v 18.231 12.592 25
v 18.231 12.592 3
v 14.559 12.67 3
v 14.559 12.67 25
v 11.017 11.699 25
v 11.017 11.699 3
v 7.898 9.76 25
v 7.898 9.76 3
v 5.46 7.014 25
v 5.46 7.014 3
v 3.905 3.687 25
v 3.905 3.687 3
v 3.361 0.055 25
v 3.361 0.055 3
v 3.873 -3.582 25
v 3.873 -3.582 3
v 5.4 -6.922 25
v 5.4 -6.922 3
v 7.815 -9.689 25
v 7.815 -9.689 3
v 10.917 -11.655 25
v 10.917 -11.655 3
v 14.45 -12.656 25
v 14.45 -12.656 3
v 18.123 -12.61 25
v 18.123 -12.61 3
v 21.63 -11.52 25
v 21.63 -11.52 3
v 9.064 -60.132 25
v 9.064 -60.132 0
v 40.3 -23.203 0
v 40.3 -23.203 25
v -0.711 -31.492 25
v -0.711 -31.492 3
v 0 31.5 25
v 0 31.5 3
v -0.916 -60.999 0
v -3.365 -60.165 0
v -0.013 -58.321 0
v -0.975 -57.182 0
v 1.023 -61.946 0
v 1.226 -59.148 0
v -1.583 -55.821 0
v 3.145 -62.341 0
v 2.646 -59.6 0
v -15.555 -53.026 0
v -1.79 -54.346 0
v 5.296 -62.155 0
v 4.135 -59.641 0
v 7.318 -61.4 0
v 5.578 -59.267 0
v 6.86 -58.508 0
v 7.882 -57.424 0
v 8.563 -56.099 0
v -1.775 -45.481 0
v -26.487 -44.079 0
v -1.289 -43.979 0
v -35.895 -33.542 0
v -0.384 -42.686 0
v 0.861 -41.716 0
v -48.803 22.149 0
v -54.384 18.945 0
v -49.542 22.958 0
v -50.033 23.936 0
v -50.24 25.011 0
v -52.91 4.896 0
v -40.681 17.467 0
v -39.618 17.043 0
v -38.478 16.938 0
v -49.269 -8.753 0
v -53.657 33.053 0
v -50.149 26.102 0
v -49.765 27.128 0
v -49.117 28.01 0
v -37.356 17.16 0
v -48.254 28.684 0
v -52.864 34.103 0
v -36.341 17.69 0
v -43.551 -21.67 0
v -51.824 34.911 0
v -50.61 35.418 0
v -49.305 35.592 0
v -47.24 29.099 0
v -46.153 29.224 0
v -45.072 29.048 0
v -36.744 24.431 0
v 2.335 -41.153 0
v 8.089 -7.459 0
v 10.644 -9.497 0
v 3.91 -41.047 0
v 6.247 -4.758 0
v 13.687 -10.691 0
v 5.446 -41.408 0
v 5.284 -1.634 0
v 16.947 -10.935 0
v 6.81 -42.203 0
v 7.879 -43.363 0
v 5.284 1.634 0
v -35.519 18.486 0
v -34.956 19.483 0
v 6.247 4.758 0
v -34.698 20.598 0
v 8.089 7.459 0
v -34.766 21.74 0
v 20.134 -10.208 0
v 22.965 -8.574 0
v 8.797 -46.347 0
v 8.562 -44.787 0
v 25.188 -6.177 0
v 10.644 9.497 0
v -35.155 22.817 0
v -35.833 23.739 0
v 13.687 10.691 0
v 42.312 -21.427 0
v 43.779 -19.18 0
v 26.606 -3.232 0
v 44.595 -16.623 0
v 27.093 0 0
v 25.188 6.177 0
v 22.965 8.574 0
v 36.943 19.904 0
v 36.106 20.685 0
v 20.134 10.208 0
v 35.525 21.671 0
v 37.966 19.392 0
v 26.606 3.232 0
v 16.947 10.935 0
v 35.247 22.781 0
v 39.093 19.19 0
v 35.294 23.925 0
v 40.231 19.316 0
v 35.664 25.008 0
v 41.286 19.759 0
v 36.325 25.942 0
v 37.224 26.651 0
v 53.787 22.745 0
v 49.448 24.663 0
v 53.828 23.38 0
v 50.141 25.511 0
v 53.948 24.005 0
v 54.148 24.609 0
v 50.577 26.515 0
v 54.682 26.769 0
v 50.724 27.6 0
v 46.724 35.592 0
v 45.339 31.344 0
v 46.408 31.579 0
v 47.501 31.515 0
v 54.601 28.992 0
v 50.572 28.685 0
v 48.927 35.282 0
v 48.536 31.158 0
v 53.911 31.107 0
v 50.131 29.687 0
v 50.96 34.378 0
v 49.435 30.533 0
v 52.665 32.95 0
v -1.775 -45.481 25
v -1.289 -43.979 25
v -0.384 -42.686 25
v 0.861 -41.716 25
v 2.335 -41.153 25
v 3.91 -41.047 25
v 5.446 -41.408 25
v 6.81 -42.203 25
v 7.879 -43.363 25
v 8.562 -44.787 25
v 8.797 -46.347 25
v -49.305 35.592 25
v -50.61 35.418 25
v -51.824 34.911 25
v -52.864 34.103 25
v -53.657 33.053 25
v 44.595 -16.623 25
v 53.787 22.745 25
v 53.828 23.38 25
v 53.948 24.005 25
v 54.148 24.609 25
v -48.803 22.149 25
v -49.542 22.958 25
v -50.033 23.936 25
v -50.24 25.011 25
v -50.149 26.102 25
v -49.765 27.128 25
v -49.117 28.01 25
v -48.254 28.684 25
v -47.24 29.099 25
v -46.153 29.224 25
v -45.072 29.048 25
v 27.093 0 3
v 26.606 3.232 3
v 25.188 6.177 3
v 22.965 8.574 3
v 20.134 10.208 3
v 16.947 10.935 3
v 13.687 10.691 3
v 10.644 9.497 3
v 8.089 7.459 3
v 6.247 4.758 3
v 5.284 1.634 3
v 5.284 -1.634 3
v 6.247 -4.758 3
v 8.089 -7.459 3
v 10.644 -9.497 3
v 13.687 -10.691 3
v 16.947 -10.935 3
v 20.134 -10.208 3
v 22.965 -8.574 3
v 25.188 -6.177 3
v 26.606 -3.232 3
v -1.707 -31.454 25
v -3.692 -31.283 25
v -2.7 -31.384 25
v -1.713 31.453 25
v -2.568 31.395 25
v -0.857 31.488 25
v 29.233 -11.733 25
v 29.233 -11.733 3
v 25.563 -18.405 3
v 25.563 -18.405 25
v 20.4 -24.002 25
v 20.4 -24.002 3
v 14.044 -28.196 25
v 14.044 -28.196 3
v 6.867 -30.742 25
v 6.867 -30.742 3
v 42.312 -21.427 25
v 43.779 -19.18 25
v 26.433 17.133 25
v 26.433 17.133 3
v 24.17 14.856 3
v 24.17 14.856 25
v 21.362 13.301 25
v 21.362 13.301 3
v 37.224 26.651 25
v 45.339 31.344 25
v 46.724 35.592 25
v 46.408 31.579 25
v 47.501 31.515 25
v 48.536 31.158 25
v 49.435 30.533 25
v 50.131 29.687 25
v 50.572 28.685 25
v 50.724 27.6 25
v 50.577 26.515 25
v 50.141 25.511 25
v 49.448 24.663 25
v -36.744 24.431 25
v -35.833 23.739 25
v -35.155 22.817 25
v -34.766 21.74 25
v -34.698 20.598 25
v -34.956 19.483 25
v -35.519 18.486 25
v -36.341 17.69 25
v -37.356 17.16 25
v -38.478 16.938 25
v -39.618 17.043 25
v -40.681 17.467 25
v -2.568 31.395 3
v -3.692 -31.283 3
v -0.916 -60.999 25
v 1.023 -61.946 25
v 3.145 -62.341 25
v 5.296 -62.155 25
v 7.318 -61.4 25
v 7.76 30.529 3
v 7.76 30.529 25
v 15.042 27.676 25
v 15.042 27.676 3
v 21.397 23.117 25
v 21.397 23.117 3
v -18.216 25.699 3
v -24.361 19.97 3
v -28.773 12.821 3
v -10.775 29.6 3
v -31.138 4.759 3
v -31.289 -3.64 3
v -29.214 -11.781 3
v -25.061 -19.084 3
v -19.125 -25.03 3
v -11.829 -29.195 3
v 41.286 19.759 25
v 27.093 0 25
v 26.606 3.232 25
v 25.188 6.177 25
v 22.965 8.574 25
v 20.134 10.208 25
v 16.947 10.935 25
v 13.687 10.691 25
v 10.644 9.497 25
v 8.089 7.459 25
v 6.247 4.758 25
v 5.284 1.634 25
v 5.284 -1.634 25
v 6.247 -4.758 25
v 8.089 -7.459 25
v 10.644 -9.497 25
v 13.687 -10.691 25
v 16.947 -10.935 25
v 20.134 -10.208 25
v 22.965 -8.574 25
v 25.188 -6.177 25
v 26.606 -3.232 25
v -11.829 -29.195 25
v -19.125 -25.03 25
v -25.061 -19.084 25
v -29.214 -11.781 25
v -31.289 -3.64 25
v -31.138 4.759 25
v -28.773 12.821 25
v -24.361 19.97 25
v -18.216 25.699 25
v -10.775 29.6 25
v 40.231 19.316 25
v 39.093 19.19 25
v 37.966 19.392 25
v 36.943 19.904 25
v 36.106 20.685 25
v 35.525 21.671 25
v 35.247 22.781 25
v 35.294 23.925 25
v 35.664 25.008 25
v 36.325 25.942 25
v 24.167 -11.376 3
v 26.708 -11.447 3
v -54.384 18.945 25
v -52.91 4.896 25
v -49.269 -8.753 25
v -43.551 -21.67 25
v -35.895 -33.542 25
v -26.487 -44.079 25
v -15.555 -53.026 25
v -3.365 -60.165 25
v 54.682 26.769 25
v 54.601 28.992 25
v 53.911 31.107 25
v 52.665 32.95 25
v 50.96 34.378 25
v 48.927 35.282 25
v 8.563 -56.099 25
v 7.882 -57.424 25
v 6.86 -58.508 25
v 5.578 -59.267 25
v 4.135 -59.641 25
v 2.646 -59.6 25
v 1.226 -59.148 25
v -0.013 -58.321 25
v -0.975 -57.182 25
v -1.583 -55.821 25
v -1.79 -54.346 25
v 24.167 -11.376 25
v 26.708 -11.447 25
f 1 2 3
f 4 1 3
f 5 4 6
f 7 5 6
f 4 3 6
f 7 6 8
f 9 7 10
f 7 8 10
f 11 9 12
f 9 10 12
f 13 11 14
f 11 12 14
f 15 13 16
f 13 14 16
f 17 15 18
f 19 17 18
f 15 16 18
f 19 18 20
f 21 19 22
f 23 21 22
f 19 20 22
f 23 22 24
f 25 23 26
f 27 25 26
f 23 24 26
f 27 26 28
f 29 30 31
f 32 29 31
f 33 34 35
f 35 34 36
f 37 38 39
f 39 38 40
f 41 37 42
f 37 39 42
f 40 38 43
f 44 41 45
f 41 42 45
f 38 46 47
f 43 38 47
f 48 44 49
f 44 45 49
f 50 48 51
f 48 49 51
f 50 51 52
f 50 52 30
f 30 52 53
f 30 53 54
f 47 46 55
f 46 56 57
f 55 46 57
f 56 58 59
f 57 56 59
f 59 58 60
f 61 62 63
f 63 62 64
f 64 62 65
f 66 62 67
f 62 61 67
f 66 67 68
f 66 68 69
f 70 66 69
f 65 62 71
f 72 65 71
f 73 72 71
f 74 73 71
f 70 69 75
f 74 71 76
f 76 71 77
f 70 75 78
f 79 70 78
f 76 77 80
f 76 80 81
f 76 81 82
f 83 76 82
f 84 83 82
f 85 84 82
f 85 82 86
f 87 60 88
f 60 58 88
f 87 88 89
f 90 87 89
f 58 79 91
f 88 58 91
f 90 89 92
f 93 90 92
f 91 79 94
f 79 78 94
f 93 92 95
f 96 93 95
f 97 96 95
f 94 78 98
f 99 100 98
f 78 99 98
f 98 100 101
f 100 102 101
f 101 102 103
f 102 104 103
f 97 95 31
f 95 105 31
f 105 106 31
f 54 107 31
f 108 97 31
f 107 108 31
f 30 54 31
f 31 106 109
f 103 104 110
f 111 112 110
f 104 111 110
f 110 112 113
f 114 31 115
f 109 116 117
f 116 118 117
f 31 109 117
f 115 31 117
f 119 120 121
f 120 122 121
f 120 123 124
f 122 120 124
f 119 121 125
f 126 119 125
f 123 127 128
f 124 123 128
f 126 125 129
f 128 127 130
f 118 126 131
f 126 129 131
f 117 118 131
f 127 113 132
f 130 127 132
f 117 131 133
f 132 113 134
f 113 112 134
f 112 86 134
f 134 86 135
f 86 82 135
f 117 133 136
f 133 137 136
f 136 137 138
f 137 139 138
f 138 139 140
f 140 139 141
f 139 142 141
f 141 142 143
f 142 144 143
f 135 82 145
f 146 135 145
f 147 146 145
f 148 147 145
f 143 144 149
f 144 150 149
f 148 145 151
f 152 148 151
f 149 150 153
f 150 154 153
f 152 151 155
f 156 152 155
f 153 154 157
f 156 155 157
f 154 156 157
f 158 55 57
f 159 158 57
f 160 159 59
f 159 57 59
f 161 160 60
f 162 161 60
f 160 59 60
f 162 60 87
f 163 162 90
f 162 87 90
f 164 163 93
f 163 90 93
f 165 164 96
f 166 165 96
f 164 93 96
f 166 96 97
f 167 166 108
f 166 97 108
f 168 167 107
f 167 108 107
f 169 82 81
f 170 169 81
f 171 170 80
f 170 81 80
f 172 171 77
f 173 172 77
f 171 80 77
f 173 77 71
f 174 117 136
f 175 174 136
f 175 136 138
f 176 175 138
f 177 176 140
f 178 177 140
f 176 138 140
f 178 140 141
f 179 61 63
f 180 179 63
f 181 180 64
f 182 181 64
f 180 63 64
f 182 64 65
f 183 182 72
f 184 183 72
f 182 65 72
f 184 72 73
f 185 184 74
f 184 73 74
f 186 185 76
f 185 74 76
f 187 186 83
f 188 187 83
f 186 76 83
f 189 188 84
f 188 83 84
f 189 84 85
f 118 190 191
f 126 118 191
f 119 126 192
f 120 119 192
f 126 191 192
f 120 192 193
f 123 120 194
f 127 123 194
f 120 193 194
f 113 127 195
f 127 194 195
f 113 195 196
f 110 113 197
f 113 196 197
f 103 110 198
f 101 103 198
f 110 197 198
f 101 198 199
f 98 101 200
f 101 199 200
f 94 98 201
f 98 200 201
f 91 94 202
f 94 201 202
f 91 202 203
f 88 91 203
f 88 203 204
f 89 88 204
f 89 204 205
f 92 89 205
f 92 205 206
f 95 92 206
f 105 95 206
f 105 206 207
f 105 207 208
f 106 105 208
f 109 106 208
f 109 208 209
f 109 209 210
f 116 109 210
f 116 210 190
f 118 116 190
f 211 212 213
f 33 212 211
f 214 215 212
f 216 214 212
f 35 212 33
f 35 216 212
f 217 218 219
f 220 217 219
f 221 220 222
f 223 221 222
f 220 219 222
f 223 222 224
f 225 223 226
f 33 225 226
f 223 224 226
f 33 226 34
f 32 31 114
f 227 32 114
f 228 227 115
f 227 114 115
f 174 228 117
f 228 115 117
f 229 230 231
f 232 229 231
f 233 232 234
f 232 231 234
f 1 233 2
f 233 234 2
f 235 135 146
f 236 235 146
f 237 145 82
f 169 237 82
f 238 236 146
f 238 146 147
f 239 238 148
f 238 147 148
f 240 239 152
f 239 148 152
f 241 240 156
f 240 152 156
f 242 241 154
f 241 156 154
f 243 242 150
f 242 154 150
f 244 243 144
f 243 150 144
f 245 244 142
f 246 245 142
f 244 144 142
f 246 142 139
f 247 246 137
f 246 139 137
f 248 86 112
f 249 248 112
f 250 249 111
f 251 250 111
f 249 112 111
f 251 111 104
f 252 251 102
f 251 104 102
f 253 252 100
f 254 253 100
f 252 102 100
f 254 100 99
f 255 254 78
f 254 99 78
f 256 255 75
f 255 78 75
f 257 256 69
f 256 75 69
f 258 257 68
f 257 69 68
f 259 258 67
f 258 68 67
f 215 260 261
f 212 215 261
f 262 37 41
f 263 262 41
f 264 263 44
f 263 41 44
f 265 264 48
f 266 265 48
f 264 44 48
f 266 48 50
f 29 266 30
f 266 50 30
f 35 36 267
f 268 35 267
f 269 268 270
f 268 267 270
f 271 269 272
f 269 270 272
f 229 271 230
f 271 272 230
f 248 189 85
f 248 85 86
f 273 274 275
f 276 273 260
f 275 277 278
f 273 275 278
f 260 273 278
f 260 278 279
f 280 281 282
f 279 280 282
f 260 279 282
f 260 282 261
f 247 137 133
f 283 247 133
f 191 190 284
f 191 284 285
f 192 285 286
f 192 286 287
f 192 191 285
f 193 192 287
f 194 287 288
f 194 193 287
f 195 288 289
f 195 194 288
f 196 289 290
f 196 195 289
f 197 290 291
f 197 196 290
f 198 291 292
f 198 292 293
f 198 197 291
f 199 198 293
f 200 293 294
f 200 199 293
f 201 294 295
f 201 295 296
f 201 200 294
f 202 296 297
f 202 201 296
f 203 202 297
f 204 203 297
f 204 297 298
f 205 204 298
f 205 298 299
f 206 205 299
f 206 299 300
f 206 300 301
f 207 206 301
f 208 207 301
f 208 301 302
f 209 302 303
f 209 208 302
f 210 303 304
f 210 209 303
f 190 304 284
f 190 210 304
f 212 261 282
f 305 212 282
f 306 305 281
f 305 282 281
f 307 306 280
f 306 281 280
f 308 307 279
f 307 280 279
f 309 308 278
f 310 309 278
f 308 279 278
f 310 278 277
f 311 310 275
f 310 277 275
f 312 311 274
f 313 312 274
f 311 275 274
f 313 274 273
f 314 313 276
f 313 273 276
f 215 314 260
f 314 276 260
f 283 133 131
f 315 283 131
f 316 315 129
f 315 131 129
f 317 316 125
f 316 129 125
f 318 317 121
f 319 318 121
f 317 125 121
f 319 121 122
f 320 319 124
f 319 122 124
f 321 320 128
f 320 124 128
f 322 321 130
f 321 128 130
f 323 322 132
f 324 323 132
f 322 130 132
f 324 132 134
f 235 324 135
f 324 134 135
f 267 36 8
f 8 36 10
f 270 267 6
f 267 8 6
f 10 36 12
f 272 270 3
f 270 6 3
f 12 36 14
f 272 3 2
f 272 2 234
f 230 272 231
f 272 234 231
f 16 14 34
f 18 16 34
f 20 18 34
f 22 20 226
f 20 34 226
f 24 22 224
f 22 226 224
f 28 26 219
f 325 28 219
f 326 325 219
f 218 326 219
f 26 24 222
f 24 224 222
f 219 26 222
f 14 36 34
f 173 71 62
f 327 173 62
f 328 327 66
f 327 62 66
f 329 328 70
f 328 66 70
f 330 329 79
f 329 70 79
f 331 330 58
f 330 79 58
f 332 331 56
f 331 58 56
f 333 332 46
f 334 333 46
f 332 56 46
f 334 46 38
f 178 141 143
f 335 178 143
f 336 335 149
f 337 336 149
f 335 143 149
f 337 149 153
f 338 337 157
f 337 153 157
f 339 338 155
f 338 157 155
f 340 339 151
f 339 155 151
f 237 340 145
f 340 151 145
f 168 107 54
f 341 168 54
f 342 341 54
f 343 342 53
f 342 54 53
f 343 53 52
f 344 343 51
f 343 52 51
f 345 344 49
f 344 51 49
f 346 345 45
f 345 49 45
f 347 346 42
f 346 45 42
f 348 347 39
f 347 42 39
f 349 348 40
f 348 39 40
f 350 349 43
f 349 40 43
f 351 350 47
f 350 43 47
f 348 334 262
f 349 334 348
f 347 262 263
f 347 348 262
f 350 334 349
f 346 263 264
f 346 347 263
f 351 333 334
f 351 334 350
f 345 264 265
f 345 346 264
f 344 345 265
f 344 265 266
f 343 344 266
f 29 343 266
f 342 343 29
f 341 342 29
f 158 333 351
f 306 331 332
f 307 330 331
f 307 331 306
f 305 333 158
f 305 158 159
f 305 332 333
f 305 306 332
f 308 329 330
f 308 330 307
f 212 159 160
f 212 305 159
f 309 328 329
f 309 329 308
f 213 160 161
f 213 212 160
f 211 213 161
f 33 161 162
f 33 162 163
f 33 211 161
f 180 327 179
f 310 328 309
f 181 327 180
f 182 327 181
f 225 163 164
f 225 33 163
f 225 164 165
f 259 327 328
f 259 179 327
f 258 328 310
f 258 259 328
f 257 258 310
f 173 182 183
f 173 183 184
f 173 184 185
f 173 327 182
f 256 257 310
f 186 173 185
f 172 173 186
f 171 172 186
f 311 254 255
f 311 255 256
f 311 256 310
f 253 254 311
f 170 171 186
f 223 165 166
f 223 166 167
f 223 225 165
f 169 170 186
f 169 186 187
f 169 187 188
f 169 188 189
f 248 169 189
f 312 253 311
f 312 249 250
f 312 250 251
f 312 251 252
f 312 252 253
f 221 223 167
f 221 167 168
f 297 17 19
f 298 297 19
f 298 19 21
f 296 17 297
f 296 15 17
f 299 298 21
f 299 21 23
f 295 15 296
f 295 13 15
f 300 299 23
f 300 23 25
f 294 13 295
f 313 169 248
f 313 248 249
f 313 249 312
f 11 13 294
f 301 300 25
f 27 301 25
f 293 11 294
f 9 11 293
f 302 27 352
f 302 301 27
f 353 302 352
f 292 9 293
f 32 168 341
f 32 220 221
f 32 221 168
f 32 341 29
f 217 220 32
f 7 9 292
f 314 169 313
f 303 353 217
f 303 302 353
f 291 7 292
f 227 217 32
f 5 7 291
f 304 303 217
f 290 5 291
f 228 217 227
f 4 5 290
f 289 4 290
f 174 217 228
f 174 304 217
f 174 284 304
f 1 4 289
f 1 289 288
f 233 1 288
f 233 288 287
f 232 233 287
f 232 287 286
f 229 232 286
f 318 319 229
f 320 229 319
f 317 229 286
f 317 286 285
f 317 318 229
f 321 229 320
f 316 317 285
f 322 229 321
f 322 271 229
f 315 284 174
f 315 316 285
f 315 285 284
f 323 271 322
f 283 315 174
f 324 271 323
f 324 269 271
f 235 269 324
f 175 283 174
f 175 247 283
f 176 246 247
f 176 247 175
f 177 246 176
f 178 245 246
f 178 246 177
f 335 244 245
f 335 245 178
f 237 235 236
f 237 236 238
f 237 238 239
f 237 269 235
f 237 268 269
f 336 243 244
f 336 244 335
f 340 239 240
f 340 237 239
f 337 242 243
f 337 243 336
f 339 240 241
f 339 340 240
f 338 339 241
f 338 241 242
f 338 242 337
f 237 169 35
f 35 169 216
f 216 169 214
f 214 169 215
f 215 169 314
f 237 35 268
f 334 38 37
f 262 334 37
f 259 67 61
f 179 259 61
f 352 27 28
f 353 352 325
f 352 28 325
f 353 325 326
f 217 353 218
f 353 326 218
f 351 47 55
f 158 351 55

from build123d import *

# Parameters (mm, degrees)
F1_DEPTH = 25
F2_R     = 33.4969963506
F2_R_2   = 31.5
F3_DEPTH = 3
F4_R     = 10.9661073878
F5_DEPTH = 25
F6_DEPTH = 22
F7_DEPTH = 25


with BuildPart() as f1:
    # F0 (on Top) → F1 (new body)
    with BuildSketch(Plane.XY):
        with BuildLine():
            ThreePointArc((53.7871589783, 22.7454871565), (53.8780832708, 23.694684553), (54.1475492573, 24.6093599089))
            ThreePointArc((54.1475492573, 24.6093599089), (53.3520531244, 32.0716472029), (46.7241737037, 35.5915563126))
            Line((46.7241737037, 35.5915563126), (-49.3051404481, 35.5915563126))
            ThreePointArc((-49.3051404481, 35.5915563126), (-51.824342213, 34.910540275), (-53.6572972564, 33.0530052997))
            ThreePointArc((-53.6572972564, 33.0530052997), (-43.5514249028, -21.6702688765), (-3.3649580648, -60.1645967141))
            Line((-3.3649580648, -60.1645967141), (-0.9160143624, -60.9986215442))
            ThreePointArc((-0.9160143624, -60.9986215442), (4.2266959979, -62.32076541), (9.0644102401, -60.1316890835))
            Line((9.0644102401, -60.1316890835), (40.2996465564, -23.2034455985))
            ThreePointArc((40.2996465564, -23.2034455985), (43.1207673401, -20.3529292947), (44.5950298413, -16.6232221009))
            Line((44.5950298413, -16.6232221009), (53.7871589783, 22.7454871565))
        make_face()
        with BuildLine():
            ThreePointArc((8.563389259, -56.098732374), (2.6455954518, -59.6001717259), (-1.7897081955, -54.3457980587))
            Line((-1.7897081955, -54.3457980587), (-1.775094173, -45.4805905471))
            ThreePointArc((-1.775094173, -45.4805905471), (3.9099702523, -41.0468470679), (8.7971219068, -46.3472043639))
            Line((8.7971219068, -46.3472043639), (8.563389259, -56.098732374))
        make_face(mode=Mode.SUBTRACT)
        with BuildLine():
            ThreePointArc((0, 31.5), (22.2738636074, 22.2738636074), (31.5, 0))
            ThreePointArc((31.5, 0), (22.0210780969, -22.5238122762), (-0.7109282192, -31.4919764554))
            ThreePointArc((-0.7109282192, -31.4919764554), (-2.2037245281, -31.4228197049), (-3.6915609888, -31.282940678))
            ThreePointArc((-3.6915609888, -31.282940678), (-31.4949418681, 0.5644791617), (-2.5681911856, 31.3951332858))
            ThreePointArc((-2.5681911856, 31.3951332858), (-1.2851656502, 31.4737724026), (0, 31.5))
        make_face(mode=Mode.SUBTRACT)
        with BuildLine():
            ThreePointArc((-48.8032426669, 22.148864889), (-49.7645237359, 27.1276520058), (-45.0716722429, 29.0484662373))
            Line((-45.0716722429, 29.0484662373), (-36.743987983, 24.4311855453))
            ThreePointArc((-36.743987983, 24.4311855453), (-35.2015648727, 18.9642062238), (-40.6811828695, 17.4673032339))
            Line((-40.6811828695, 17.4673032339), (-48.8032426669, 22.148864889))
        make_face(mode=Mode.SUBTRACT)
        with BuildLine():
            ThreePointArc((41.2858330553, 19.7592478666), (35.7800785258, 21.1569599304), (37.223531508, 26.6508998136))
            Line((37.223531508, 26.6508998136), (45.3389127294, 31.3440291017))
            ThreePointArc((45.3389127294, 31.3440291017), (50.131309387, 29.6871293693), (49.448357561, 24.6625936444))
            Line((49.448357561, 24.6625936444), (41.2858330553, 19.7592478666))
        make_face(mode=Mode.SUBTRACT)
    extrude(amount=F1_DEPTH)

    # F2 (on face) → F3 (join)
    with BuildSketch(Plane(origin=(0, 0, 0), x_dir=(1, 0, 0), z_dir=(0, 0, -1))):
        Circle(F2_R)
        Circle(F2_R_2, mode=Mode.SUBTRACT)
        Circle(F2_R_2)
    extrude(amount=-F3_DEPTH)

    # F4 (on face) → F5 (cut)
    with BuildSketch(Plane.XY.offset(3)):
        with Locations((16.1272473633, 0)):
            Circle(F4_R)
    extrude(amount=-F5_DEPTH, mode=Mode.SUBTRACT)

    # F4 (on face) → F6 (join)
    with BuildSketch(Plane.XY.offset(3)):
        with BuildLine():
            ThreePointArc((26.4328128914, 17.1334877549), (22.8210045885, 13.9789914635), (18.2305140411, 12.5921235522))
            ThreePointArc((18.2305140411, 12.5921235522), (3.48568477, -1.7821900775), (21.6297892683, -11.5198671371))
            ThreePointArc((21.6297892683, -11.5198671371), (25.4383279787, -11.3846100228), (29.2333080601, -11.7330175088))
            ThreePointArc((29.2333080601, -11.7330175088), (32.5859089375, 3.1613345542), (26.4328128914, 17.1334877549))
        make_face()
        with Locations((16.1272473633, 0)):
            Circle(F4_R, mode=Mode.SUBTRACT)
    extrude(amount=F6_DEPTH)

    # F0 (on Top) → F7 (join)
    with BuildSketch(Plane.XY):
        with BuildLine():
            Line((-0.7109282192, -31.4919764554), (0, 31.5))
            ThreePointArc((0, 31.5), (-1.2851656502, 31.4737724026), (-2.5681911856, 31.3951332858))
            Line((-2.5681911856, 31.3951332858), (-3.6915609888, -31.282940678))
            ThreePointArc((-3.6915609888, -31.282940678), (-2.2037245281, -31.4228197049), (-0.7109282192, -31.4919764554))
        make_face()
    extrude(amount=F7_DEPTH)


solid = f1.part
